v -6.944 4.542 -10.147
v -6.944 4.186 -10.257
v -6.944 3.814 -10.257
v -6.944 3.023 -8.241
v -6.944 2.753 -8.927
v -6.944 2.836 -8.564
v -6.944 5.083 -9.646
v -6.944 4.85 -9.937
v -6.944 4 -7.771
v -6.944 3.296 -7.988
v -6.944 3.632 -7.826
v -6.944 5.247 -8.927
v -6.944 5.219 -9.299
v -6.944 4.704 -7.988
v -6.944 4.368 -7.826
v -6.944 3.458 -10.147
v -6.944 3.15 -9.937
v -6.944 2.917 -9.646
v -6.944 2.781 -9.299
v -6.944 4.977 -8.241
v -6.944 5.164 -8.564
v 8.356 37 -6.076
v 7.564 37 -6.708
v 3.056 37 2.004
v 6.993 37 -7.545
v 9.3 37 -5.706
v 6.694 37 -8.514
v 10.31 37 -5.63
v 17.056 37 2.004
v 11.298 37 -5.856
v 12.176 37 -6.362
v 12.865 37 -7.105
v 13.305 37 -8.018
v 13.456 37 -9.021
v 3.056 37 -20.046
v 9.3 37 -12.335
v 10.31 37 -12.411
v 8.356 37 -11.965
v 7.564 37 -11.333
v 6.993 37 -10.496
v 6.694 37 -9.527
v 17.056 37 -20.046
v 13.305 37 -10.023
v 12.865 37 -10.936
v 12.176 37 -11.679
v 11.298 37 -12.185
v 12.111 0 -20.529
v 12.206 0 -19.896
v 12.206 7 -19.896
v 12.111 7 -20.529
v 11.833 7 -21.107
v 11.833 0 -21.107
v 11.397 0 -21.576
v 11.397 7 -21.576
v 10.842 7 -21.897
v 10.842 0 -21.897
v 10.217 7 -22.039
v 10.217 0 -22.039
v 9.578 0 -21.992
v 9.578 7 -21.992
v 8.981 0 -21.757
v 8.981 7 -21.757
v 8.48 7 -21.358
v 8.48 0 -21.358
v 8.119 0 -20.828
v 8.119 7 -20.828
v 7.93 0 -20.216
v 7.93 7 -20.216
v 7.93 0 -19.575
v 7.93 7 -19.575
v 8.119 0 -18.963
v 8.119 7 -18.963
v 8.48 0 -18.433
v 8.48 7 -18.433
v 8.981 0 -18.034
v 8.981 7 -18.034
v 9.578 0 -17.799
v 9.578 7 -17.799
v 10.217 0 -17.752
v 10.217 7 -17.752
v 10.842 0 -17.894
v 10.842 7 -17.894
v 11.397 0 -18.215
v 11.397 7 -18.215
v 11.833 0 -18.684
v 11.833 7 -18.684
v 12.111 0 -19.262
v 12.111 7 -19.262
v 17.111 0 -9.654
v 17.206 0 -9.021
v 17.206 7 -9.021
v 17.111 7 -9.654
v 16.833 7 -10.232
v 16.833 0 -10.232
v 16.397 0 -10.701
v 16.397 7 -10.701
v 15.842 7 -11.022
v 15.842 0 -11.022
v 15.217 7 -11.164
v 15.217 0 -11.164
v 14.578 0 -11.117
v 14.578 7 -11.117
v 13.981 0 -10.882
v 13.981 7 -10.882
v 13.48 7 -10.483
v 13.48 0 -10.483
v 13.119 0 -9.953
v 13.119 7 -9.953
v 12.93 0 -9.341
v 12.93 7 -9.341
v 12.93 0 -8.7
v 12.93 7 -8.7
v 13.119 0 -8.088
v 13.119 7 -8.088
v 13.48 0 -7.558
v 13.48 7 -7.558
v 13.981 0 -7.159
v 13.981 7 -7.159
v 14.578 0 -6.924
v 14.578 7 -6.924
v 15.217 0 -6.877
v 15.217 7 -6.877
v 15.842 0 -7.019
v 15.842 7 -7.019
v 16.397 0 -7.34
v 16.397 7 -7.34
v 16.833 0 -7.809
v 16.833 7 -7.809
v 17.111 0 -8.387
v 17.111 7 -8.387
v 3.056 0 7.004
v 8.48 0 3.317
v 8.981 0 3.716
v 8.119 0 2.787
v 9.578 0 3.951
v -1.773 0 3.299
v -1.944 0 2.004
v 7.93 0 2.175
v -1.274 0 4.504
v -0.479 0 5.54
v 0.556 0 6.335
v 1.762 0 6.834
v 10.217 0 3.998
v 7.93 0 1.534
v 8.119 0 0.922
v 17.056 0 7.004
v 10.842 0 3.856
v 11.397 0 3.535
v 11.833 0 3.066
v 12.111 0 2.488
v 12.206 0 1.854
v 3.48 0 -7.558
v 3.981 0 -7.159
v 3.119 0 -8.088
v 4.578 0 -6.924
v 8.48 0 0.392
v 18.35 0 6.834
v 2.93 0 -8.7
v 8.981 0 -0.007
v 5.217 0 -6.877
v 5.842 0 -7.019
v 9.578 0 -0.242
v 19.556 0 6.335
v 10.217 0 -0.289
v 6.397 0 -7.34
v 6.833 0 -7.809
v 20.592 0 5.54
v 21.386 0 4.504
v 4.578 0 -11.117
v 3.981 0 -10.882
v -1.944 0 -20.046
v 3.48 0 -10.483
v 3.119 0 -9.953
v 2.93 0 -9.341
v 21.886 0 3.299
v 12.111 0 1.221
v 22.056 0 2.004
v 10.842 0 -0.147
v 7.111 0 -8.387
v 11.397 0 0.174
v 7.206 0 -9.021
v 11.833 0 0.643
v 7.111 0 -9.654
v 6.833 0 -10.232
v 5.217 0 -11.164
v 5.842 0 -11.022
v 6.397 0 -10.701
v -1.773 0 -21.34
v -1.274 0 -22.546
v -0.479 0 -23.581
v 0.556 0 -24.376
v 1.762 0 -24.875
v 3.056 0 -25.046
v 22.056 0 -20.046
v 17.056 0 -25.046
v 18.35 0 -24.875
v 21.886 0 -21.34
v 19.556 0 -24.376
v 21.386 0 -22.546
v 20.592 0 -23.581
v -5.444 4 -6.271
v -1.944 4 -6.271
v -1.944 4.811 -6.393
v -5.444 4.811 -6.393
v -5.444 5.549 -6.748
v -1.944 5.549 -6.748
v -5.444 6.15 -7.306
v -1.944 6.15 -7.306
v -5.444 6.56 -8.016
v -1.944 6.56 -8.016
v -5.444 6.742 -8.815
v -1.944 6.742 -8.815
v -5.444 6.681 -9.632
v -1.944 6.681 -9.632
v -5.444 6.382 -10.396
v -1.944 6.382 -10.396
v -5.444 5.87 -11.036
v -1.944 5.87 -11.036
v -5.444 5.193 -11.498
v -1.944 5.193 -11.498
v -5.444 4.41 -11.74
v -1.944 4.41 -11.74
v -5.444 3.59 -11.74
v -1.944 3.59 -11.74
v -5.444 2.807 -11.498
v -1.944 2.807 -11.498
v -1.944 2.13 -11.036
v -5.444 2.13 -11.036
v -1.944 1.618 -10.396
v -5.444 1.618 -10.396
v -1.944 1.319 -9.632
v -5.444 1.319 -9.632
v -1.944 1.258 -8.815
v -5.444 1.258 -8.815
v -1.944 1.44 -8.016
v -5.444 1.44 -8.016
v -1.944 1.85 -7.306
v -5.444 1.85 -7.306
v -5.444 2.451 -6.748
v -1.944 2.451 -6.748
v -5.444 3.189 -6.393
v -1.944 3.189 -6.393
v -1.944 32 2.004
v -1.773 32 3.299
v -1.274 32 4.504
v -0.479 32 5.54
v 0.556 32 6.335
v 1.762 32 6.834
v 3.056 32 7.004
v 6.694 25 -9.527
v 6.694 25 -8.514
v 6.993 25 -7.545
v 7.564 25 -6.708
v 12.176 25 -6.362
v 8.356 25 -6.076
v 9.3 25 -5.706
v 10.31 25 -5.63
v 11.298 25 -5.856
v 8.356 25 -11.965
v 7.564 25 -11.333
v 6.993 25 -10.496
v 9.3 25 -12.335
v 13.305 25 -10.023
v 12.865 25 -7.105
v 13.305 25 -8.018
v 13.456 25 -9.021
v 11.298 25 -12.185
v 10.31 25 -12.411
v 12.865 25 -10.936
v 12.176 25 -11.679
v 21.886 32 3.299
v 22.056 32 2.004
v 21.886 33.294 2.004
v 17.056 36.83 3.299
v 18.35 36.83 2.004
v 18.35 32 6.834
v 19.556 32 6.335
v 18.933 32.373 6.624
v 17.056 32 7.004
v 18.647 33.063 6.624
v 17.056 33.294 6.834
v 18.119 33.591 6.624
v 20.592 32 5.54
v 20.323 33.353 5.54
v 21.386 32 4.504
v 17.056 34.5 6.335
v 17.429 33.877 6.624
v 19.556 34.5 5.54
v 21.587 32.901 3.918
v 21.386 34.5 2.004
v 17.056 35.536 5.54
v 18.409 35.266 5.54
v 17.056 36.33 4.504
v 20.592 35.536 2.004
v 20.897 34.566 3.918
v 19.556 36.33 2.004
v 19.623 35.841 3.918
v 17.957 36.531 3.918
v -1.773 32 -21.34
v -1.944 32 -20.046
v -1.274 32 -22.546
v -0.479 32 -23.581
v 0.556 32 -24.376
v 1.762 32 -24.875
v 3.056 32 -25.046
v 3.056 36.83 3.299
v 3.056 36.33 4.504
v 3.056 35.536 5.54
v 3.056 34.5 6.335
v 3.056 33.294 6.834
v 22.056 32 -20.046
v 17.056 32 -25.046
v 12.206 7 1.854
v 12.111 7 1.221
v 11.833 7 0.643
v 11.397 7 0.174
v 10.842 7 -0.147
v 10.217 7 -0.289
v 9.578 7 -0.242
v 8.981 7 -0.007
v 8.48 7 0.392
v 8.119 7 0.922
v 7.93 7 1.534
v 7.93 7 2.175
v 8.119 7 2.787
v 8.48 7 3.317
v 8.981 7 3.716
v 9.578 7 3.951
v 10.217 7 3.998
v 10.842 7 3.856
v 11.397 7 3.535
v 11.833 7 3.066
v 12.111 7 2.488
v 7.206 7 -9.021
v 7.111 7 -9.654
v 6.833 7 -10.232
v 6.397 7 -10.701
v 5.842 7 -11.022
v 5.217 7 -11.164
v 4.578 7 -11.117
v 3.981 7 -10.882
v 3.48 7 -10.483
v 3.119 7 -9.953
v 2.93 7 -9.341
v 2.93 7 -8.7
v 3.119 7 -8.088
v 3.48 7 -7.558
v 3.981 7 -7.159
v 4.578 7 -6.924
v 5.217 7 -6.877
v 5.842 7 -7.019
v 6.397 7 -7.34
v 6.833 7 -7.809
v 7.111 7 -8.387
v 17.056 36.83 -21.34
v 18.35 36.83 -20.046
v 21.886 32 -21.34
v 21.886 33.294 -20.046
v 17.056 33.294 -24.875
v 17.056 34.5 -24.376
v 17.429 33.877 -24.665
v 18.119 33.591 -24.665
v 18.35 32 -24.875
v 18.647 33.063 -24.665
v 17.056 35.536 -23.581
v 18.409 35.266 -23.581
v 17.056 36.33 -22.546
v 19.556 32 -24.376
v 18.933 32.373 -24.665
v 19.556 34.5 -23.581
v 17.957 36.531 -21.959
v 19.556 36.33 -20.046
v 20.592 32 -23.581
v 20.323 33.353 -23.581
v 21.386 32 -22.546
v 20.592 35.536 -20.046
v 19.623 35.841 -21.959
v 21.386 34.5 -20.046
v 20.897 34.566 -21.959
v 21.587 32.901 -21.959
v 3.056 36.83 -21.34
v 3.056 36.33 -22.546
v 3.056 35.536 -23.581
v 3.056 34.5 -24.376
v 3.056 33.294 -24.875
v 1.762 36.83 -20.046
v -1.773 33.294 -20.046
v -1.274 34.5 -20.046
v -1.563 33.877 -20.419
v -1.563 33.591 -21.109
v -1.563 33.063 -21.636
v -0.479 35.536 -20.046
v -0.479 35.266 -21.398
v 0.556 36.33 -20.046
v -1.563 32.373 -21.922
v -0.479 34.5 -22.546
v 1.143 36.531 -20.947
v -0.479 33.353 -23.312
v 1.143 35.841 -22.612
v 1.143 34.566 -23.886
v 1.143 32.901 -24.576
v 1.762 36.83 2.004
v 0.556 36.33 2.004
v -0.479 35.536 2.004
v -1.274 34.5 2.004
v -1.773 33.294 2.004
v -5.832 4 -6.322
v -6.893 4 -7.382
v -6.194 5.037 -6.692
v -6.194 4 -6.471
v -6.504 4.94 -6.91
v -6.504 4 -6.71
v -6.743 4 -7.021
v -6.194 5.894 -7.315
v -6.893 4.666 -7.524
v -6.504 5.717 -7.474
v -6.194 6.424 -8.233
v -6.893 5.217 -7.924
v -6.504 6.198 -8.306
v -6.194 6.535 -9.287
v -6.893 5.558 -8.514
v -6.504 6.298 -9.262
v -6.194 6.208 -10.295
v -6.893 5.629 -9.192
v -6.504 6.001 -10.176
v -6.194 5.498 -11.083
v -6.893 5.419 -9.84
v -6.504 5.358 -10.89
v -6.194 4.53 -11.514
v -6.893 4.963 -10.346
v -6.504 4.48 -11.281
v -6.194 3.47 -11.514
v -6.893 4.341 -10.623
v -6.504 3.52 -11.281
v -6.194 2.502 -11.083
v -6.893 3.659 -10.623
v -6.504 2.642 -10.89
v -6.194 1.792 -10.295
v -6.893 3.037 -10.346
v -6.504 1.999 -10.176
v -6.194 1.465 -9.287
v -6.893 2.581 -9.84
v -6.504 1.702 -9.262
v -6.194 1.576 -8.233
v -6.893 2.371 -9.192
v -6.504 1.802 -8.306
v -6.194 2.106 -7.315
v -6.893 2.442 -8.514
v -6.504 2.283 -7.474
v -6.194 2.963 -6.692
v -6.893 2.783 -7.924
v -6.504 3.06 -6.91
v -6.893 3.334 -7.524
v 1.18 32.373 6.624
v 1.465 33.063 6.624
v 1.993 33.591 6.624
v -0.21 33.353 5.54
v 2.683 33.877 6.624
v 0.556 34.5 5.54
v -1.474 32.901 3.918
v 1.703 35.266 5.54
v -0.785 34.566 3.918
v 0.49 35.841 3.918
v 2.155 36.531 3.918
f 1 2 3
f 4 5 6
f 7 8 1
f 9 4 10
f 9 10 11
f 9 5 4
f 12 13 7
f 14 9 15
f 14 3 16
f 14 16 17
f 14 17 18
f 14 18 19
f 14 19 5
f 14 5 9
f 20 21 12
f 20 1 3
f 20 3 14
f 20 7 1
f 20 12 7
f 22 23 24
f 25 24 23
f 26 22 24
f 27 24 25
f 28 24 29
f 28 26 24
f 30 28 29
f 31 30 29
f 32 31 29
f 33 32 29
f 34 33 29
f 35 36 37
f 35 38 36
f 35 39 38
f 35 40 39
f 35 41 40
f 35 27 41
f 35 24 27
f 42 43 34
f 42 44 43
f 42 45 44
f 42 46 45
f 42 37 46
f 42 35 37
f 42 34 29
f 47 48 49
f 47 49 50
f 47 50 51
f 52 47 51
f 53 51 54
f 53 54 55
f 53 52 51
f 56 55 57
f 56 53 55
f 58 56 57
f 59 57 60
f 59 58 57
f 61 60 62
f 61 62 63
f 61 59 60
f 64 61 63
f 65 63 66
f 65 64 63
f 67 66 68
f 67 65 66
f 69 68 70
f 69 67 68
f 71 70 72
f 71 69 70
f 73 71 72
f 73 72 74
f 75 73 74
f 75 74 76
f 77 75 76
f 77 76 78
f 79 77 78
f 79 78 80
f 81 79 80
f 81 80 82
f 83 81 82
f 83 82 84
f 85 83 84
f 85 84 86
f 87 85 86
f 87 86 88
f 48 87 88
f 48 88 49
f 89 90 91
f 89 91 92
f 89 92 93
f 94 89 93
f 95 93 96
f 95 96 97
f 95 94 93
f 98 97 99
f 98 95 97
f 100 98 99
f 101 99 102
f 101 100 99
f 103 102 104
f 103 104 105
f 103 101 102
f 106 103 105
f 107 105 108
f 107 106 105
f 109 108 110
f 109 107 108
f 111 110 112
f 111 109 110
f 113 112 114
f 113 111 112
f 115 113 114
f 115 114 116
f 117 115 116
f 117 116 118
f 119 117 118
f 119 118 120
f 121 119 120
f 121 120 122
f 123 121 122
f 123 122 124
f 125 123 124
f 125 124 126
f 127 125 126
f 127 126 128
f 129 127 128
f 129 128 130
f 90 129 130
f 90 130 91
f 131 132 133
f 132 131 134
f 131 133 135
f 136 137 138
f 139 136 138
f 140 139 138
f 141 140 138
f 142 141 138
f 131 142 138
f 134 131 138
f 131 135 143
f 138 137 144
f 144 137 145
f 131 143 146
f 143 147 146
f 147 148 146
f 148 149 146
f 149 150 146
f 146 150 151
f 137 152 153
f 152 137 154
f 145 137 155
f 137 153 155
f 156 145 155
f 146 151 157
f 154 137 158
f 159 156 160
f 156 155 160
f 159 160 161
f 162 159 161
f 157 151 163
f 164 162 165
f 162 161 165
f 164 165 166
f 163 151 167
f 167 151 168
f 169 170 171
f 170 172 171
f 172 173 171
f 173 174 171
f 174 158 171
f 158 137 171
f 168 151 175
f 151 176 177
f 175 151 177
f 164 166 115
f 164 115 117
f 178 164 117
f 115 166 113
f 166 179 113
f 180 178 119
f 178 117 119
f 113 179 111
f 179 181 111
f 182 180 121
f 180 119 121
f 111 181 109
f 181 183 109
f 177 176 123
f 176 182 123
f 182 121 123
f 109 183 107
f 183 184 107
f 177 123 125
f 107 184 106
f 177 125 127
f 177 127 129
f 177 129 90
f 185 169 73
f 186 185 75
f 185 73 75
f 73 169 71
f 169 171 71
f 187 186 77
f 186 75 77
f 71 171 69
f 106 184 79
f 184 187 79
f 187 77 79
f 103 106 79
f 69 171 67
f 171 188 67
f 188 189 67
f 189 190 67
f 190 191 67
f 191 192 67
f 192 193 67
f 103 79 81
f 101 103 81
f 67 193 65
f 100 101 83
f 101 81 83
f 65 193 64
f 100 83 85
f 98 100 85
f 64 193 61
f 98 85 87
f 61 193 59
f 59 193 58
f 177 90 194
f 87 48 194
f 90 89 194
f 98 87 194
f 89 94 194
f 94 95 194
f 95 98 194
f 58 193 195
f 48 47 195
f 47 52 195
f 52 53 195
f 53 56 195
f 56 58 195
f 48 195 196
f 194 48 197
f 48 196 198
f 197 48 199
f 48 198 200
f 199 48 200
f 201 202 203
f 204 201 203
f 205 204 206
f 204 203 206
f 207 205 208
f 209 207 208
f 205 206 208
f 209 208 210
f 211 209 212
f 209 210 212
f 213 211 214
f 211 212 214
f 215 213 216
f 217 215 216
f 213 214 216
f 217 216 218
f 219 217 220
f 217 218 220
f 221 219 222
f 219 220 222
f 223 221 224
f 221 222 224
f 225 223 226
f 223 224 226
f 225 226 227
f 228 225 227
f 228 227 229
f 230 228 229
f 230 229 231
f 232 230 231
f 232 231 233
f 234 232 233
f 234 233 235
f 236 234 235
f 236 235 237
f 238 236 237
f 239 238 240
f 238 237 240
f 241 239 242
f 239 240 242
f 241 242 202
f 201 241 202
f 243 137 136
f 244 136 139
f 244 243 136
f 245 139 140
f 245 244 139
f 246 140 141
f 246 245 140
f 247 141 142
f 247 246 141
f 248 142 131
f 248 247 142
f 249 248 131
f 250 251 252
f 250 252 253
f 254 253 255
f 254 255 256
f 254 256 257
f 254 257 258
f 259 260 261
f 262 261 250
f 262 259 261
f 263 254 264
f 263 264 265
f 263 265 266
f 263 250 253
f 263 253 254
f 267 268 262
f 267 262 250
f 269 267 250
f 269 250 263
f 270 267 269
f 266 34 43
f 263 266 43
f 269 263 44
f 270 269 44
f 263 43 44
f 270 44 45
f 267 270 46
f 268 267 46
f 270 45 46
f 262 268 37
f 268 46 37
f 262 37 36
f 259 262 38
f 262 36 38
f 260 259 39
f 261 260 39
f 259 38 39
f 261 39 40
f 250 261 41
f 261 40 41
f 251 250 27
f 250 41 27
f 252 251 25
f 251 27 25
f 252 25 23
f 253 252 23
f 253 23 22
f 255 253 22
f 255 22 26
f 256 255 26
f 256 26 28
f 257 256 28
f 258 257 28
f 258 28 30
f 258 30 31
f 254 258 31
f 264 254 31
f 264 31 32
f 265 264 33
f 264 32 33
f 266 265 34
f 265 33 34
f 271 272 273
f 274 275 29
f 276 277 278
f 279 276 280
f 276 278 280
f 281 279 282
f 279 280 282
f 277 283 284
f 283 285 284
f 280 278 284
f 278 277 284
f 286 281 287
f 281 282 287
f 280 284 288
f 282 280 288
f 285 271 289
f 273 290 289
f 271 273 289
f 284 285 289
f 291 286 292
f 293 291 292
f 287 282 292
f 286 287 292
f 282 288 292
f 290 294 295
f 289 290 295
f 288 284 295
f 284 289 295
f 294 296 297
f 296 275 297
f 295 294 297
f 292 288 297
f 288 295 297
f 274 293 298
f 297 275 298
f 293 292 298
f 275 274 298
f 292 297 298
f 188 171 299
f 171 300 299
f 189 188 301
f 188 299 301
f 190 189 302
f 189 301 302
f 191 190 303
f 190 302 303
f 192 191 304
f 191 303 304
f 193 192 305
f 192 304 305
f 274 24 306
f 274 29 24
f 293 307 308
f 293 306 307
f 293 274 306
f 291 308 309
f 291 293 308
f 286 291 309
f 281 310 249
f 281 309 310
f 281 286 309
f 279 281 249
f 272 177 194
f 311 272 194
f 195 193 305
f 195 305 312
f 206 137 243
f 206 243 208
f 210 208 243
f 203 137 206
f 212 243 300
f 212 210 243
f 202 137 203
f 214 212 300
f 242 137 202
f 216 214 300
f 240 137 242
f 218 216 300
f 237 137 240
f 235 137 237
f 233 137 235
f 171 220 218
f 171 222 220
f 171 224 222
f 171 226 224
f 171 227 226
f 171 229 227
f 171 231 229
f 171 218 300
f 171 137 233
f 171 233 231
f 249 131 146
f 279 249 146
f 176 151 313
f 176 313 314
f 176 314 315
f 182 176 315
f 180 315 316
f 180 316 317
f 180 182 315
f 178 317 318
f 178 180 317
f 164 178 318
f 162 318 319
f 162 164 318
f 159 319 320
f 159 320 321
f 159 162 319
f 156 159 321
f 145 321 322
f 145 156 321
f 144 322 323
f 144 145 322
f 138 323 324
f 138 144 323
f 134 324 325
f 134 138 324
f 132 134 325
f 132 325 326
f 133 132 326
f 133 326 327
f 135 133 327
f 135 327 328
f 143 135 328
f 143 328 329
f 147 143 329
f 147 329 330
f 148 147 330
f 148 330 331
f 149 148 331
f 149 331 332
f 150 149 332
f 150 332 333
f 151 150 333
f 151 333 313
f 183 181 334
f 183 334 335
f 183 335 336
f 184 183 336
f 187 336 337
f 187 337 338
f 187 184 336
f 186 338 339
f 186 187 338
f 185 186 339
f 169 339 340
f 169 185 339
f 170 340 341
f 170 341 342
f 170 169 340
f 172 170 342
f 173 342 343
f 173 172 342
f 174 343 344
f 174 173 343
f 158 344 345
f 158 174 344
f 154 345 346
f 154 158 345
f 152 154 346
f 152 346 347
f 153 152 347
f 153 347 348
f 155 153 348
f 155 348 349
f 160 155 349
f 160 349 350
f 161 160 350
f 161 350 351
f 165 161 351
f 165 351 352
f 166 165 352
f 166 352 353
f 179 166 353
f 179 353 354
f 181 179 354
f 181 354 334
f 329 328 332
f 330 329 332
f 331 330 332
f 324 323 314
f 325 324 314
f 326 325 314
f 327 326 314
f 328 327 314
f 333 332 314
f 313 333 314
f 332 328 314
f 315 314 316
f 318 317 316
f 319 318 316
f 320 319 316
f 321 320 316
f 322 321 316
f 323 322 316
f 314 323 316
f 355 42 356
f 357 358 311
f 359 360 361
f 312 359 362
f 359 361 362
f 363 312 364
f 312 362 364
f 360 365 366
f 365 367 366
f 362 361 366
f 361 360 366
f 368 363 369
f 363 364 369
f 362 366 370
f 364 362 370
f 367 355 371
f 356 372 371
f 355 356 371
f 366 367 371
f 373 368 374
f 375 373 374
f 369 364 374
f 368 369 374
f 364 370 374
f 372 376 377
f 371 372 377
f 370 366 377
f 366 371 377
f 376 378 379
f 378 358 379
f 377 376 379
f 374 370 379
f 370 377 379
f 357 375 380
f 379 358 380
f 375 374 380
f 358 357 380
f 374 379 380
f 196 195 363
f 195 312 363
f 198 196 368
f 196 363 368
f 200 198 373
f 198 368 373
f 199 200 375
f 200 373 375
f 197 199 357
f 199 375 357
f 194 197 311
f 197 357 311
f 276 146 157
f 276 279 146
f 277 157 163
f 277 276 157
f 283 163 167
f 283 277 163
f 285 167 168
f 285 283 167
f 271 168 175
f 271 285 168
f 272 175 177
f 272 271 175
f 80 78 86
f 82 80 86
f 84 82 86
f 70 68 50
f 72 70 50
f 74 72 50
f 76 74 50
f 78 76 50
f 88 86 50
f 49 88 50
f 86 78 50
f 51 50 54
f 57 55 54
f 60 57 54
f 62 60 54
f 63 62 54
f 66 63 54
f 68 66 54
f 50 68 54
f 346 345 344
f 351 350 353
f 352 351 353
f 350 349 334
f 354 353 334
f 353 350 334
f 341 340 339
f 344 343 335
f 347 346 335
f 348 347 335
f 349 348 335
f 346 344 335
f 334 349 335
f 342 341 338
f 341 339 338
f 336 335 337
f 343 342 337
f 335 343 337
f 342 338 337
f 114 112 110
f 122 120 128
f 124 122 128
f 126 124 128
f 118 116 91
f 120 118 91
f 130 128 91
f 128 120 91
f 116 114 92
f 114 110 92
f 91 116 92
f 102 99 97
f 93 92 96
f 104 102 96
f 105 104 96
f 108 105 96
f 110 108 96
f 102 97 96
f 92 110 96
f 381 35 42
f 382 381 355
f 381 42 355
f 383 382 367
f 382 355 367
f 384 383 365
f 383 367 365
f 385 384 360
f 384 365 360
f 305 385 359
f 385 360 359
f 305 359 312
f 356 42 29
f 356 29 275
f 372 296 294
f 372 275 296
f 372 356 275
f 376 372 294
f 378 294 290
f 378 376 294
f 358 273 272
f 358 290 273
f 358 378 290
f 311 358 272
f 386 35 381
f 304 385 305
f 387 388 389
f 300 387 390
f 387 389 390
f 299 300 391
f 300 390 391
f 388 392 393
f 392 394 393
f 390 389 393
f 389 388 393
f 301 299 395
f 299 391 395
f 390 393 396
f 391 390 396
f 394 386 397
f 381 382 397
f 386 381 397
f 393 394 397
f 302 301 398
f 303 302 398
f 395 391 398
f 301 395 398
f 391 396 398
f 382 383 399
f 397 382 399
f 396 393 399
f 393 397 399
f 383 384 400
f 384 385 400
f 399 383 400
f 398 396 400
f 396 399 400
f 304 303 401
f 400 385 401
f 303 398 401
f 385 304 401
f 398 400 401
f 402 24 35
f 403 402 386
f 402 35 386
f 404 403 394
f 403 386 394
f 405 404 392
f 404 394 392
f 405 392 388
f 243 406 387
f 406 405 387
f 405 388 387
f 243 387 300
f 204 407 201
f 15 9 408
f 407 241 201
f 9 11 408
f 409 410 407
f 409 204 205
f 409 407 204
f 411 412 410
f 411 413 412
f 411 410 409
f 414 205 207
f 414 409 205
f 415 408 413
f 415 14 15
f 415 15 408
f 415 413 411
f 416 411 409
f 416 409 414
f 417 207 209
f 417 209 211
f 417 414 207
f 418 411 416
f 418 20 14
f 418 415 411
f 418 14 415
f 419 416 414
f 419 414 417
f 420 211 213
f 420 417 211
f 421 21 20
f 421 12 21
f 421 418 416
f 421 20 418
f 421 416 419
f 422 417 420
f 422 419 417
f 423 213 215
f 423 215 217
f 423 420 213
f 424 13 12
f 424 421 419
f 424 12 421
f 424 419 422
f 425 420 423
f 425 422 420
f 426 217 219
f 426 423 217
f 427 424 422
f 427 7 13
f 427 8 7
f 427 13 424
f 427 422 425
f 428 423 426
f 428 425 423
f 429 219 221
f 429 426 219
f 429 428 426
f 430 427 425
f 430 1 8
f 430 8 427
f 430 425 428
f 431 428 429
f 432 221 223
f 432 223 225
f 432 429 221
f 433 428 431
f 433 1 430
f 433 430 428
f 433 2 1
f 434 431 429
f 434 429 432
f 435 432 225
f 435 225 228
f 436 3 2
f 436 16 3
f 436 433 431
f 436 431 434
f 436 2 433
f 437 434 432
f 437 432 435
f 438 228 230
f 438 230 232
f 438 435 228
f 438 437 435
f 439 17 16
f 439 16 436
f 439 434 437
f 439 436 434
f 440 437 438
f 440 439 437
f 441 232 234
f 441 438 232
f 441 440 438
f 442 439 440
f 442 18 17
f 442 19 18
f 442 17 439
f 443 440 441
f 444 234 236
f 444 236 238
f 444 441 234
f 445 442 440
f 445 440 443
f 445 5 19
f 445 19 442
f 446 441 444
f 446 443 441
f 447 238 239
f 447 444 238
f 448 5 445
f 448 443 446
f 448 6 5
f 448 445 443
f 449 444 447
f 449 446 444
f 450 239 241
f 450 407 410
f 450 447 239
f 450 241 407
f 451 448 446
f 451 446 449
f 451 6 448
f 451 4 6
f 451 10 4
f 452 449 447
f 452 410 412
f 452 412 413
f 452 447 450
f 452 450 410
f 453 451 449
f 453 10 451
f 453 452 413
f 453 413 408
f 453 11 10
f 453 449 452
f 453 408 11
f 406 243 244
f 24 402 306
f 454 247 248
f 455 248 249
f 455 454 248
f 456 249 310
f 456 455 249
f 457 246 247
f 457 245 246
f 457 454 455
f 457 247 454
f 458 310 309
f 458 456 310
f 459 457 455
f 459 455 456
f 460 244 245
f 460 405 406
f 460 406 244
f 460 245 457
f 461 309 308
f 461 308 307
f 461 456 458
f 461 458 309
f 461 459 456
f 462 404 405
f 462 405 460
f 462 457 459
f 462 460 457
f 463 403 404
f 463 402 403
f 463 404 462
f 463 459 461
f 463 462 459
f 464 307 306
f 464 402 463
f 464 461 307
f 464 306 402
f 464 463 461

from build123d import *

# Parameters (mm, degrees)
SKETCH1_W           = 24
SKETCH1_H           = 32.05
SKETCH1_R           = 2.15
BOSS_EXTRUDE1_DEPTH = 37
SKETCH2_R           = 2.15
BOSS_EXTRUDE2_DEPTH = 30
SKETCH3_R           = 3.4
CUT_EXTRUDE1_DEPTH  = 12
FILLET1_R           = 5
SKETCH4_R           = 2.75
BOSS_EXTRUDE3_DEPTH = 5
FILLET2_R           = 1.5


with BuildPart() as part:
    # Sketch1 → Boss-Extrude1 (new body)
    with BuildSketch(Plane(origin=(0, 0, 0), x_dir=(1, 0, 0), z_dir=(0, 1, 0))):
        with Locations((10.056177559, 9.020502124)):
            Rectangle(SKETCH1_W, SKETCH1_H)
        with Locations((5.056177559, 9.020502124)):
            Circle(SKETCH1_R, mode=Mode.SUBTRACT)
        with Locations((15.056177559, 9.020502124)):
            Circle(SKETCH1_R, mode=Mode.SUBTRACT)
        with Locations((10.056177559, 19.895502124)):
            Circle(SKETCH1_R, mode=Mode.SUBTRACT)
        with Locations((10.056177559, -1.854497876)):
            Circle(SKETCH1_R, mode=Mode.SUBTRACT)
    extrude(amount=BOSS_EXTRUDE1_DEPTH)

    # Sketch2 → Boss-Extrude2 (add)
    with BuildSketch(Plane(origin=(0, 37, 0), x_dir=(1, 0, 0), z_dir=(0, 1, 0))):
        with Locations((10.056177559, 19.895502124)):
            Circle(SKETCH2_R)
        with Locations((15.056177559, 9.020502124)):
            Circle(SKETCH2_R)
        with Locations((10.056177559, -1.854497876)):
            Circle(SKETCH2_R)
        with Locations((5.056177559, 9.020502124)):
            Circle(SKETCH2_R)
    extrude(amount=-BOSS_EXTRUDE2_DEPTH)

    # Sketch3 → Cut-Extrude1 (cut)
    with BuildSketch(Plane(origin=(0, 37, 0), x_dir=(1, 0, 0), z_dir=(0, 1, 0))):
        with Locations((10.056177559, 9.020502124)):
            Circle(SKETCH3_R)
    extrude(amount=-CUT_EXTRUDE1_DEPTH, mode=Mode.SUBTRACT)

    # Fillet1
    fillet1_edges = [part.edges().sort_by_distance(p)[0] for p in [
        (22.056177559, 37, -9.020502124),
        (10.056177559, 37, -25.045502124),
        (-1.943822441, 37, -9.020502124),
        (-1.943822441, 18.5, -25.045502124),
        (22.056177559, 18.5, -25.045502124),
        (22.056177559, 18.5, 7.004497876),
        (-1.943822441, 18.5, 7.004497876),
        (10.056177559, 37, 7.004497876),
    ]]
    fillet(fillet1_edges, radius=FILLET1_R)

    # Sketch4 → Boss-Extrude3 (add)
    with BuildSketch(Plane.ZY.offset(1.943822441)):
        with Locations((-9.020502124, 4)):
            Circle(SKETCH4_R)
    extrude(amount=BOSS_EXTRUDE3_DEPTH)

    # Fillet2
    fillet2_edges = [part.edges().sort_by_distance(p)[0] for p in [
        (-6.943822441, 4, -11.770502124),
    ]]
    fillet(fillet2_edges, radius=FILLET2_R)


solid = part.part
